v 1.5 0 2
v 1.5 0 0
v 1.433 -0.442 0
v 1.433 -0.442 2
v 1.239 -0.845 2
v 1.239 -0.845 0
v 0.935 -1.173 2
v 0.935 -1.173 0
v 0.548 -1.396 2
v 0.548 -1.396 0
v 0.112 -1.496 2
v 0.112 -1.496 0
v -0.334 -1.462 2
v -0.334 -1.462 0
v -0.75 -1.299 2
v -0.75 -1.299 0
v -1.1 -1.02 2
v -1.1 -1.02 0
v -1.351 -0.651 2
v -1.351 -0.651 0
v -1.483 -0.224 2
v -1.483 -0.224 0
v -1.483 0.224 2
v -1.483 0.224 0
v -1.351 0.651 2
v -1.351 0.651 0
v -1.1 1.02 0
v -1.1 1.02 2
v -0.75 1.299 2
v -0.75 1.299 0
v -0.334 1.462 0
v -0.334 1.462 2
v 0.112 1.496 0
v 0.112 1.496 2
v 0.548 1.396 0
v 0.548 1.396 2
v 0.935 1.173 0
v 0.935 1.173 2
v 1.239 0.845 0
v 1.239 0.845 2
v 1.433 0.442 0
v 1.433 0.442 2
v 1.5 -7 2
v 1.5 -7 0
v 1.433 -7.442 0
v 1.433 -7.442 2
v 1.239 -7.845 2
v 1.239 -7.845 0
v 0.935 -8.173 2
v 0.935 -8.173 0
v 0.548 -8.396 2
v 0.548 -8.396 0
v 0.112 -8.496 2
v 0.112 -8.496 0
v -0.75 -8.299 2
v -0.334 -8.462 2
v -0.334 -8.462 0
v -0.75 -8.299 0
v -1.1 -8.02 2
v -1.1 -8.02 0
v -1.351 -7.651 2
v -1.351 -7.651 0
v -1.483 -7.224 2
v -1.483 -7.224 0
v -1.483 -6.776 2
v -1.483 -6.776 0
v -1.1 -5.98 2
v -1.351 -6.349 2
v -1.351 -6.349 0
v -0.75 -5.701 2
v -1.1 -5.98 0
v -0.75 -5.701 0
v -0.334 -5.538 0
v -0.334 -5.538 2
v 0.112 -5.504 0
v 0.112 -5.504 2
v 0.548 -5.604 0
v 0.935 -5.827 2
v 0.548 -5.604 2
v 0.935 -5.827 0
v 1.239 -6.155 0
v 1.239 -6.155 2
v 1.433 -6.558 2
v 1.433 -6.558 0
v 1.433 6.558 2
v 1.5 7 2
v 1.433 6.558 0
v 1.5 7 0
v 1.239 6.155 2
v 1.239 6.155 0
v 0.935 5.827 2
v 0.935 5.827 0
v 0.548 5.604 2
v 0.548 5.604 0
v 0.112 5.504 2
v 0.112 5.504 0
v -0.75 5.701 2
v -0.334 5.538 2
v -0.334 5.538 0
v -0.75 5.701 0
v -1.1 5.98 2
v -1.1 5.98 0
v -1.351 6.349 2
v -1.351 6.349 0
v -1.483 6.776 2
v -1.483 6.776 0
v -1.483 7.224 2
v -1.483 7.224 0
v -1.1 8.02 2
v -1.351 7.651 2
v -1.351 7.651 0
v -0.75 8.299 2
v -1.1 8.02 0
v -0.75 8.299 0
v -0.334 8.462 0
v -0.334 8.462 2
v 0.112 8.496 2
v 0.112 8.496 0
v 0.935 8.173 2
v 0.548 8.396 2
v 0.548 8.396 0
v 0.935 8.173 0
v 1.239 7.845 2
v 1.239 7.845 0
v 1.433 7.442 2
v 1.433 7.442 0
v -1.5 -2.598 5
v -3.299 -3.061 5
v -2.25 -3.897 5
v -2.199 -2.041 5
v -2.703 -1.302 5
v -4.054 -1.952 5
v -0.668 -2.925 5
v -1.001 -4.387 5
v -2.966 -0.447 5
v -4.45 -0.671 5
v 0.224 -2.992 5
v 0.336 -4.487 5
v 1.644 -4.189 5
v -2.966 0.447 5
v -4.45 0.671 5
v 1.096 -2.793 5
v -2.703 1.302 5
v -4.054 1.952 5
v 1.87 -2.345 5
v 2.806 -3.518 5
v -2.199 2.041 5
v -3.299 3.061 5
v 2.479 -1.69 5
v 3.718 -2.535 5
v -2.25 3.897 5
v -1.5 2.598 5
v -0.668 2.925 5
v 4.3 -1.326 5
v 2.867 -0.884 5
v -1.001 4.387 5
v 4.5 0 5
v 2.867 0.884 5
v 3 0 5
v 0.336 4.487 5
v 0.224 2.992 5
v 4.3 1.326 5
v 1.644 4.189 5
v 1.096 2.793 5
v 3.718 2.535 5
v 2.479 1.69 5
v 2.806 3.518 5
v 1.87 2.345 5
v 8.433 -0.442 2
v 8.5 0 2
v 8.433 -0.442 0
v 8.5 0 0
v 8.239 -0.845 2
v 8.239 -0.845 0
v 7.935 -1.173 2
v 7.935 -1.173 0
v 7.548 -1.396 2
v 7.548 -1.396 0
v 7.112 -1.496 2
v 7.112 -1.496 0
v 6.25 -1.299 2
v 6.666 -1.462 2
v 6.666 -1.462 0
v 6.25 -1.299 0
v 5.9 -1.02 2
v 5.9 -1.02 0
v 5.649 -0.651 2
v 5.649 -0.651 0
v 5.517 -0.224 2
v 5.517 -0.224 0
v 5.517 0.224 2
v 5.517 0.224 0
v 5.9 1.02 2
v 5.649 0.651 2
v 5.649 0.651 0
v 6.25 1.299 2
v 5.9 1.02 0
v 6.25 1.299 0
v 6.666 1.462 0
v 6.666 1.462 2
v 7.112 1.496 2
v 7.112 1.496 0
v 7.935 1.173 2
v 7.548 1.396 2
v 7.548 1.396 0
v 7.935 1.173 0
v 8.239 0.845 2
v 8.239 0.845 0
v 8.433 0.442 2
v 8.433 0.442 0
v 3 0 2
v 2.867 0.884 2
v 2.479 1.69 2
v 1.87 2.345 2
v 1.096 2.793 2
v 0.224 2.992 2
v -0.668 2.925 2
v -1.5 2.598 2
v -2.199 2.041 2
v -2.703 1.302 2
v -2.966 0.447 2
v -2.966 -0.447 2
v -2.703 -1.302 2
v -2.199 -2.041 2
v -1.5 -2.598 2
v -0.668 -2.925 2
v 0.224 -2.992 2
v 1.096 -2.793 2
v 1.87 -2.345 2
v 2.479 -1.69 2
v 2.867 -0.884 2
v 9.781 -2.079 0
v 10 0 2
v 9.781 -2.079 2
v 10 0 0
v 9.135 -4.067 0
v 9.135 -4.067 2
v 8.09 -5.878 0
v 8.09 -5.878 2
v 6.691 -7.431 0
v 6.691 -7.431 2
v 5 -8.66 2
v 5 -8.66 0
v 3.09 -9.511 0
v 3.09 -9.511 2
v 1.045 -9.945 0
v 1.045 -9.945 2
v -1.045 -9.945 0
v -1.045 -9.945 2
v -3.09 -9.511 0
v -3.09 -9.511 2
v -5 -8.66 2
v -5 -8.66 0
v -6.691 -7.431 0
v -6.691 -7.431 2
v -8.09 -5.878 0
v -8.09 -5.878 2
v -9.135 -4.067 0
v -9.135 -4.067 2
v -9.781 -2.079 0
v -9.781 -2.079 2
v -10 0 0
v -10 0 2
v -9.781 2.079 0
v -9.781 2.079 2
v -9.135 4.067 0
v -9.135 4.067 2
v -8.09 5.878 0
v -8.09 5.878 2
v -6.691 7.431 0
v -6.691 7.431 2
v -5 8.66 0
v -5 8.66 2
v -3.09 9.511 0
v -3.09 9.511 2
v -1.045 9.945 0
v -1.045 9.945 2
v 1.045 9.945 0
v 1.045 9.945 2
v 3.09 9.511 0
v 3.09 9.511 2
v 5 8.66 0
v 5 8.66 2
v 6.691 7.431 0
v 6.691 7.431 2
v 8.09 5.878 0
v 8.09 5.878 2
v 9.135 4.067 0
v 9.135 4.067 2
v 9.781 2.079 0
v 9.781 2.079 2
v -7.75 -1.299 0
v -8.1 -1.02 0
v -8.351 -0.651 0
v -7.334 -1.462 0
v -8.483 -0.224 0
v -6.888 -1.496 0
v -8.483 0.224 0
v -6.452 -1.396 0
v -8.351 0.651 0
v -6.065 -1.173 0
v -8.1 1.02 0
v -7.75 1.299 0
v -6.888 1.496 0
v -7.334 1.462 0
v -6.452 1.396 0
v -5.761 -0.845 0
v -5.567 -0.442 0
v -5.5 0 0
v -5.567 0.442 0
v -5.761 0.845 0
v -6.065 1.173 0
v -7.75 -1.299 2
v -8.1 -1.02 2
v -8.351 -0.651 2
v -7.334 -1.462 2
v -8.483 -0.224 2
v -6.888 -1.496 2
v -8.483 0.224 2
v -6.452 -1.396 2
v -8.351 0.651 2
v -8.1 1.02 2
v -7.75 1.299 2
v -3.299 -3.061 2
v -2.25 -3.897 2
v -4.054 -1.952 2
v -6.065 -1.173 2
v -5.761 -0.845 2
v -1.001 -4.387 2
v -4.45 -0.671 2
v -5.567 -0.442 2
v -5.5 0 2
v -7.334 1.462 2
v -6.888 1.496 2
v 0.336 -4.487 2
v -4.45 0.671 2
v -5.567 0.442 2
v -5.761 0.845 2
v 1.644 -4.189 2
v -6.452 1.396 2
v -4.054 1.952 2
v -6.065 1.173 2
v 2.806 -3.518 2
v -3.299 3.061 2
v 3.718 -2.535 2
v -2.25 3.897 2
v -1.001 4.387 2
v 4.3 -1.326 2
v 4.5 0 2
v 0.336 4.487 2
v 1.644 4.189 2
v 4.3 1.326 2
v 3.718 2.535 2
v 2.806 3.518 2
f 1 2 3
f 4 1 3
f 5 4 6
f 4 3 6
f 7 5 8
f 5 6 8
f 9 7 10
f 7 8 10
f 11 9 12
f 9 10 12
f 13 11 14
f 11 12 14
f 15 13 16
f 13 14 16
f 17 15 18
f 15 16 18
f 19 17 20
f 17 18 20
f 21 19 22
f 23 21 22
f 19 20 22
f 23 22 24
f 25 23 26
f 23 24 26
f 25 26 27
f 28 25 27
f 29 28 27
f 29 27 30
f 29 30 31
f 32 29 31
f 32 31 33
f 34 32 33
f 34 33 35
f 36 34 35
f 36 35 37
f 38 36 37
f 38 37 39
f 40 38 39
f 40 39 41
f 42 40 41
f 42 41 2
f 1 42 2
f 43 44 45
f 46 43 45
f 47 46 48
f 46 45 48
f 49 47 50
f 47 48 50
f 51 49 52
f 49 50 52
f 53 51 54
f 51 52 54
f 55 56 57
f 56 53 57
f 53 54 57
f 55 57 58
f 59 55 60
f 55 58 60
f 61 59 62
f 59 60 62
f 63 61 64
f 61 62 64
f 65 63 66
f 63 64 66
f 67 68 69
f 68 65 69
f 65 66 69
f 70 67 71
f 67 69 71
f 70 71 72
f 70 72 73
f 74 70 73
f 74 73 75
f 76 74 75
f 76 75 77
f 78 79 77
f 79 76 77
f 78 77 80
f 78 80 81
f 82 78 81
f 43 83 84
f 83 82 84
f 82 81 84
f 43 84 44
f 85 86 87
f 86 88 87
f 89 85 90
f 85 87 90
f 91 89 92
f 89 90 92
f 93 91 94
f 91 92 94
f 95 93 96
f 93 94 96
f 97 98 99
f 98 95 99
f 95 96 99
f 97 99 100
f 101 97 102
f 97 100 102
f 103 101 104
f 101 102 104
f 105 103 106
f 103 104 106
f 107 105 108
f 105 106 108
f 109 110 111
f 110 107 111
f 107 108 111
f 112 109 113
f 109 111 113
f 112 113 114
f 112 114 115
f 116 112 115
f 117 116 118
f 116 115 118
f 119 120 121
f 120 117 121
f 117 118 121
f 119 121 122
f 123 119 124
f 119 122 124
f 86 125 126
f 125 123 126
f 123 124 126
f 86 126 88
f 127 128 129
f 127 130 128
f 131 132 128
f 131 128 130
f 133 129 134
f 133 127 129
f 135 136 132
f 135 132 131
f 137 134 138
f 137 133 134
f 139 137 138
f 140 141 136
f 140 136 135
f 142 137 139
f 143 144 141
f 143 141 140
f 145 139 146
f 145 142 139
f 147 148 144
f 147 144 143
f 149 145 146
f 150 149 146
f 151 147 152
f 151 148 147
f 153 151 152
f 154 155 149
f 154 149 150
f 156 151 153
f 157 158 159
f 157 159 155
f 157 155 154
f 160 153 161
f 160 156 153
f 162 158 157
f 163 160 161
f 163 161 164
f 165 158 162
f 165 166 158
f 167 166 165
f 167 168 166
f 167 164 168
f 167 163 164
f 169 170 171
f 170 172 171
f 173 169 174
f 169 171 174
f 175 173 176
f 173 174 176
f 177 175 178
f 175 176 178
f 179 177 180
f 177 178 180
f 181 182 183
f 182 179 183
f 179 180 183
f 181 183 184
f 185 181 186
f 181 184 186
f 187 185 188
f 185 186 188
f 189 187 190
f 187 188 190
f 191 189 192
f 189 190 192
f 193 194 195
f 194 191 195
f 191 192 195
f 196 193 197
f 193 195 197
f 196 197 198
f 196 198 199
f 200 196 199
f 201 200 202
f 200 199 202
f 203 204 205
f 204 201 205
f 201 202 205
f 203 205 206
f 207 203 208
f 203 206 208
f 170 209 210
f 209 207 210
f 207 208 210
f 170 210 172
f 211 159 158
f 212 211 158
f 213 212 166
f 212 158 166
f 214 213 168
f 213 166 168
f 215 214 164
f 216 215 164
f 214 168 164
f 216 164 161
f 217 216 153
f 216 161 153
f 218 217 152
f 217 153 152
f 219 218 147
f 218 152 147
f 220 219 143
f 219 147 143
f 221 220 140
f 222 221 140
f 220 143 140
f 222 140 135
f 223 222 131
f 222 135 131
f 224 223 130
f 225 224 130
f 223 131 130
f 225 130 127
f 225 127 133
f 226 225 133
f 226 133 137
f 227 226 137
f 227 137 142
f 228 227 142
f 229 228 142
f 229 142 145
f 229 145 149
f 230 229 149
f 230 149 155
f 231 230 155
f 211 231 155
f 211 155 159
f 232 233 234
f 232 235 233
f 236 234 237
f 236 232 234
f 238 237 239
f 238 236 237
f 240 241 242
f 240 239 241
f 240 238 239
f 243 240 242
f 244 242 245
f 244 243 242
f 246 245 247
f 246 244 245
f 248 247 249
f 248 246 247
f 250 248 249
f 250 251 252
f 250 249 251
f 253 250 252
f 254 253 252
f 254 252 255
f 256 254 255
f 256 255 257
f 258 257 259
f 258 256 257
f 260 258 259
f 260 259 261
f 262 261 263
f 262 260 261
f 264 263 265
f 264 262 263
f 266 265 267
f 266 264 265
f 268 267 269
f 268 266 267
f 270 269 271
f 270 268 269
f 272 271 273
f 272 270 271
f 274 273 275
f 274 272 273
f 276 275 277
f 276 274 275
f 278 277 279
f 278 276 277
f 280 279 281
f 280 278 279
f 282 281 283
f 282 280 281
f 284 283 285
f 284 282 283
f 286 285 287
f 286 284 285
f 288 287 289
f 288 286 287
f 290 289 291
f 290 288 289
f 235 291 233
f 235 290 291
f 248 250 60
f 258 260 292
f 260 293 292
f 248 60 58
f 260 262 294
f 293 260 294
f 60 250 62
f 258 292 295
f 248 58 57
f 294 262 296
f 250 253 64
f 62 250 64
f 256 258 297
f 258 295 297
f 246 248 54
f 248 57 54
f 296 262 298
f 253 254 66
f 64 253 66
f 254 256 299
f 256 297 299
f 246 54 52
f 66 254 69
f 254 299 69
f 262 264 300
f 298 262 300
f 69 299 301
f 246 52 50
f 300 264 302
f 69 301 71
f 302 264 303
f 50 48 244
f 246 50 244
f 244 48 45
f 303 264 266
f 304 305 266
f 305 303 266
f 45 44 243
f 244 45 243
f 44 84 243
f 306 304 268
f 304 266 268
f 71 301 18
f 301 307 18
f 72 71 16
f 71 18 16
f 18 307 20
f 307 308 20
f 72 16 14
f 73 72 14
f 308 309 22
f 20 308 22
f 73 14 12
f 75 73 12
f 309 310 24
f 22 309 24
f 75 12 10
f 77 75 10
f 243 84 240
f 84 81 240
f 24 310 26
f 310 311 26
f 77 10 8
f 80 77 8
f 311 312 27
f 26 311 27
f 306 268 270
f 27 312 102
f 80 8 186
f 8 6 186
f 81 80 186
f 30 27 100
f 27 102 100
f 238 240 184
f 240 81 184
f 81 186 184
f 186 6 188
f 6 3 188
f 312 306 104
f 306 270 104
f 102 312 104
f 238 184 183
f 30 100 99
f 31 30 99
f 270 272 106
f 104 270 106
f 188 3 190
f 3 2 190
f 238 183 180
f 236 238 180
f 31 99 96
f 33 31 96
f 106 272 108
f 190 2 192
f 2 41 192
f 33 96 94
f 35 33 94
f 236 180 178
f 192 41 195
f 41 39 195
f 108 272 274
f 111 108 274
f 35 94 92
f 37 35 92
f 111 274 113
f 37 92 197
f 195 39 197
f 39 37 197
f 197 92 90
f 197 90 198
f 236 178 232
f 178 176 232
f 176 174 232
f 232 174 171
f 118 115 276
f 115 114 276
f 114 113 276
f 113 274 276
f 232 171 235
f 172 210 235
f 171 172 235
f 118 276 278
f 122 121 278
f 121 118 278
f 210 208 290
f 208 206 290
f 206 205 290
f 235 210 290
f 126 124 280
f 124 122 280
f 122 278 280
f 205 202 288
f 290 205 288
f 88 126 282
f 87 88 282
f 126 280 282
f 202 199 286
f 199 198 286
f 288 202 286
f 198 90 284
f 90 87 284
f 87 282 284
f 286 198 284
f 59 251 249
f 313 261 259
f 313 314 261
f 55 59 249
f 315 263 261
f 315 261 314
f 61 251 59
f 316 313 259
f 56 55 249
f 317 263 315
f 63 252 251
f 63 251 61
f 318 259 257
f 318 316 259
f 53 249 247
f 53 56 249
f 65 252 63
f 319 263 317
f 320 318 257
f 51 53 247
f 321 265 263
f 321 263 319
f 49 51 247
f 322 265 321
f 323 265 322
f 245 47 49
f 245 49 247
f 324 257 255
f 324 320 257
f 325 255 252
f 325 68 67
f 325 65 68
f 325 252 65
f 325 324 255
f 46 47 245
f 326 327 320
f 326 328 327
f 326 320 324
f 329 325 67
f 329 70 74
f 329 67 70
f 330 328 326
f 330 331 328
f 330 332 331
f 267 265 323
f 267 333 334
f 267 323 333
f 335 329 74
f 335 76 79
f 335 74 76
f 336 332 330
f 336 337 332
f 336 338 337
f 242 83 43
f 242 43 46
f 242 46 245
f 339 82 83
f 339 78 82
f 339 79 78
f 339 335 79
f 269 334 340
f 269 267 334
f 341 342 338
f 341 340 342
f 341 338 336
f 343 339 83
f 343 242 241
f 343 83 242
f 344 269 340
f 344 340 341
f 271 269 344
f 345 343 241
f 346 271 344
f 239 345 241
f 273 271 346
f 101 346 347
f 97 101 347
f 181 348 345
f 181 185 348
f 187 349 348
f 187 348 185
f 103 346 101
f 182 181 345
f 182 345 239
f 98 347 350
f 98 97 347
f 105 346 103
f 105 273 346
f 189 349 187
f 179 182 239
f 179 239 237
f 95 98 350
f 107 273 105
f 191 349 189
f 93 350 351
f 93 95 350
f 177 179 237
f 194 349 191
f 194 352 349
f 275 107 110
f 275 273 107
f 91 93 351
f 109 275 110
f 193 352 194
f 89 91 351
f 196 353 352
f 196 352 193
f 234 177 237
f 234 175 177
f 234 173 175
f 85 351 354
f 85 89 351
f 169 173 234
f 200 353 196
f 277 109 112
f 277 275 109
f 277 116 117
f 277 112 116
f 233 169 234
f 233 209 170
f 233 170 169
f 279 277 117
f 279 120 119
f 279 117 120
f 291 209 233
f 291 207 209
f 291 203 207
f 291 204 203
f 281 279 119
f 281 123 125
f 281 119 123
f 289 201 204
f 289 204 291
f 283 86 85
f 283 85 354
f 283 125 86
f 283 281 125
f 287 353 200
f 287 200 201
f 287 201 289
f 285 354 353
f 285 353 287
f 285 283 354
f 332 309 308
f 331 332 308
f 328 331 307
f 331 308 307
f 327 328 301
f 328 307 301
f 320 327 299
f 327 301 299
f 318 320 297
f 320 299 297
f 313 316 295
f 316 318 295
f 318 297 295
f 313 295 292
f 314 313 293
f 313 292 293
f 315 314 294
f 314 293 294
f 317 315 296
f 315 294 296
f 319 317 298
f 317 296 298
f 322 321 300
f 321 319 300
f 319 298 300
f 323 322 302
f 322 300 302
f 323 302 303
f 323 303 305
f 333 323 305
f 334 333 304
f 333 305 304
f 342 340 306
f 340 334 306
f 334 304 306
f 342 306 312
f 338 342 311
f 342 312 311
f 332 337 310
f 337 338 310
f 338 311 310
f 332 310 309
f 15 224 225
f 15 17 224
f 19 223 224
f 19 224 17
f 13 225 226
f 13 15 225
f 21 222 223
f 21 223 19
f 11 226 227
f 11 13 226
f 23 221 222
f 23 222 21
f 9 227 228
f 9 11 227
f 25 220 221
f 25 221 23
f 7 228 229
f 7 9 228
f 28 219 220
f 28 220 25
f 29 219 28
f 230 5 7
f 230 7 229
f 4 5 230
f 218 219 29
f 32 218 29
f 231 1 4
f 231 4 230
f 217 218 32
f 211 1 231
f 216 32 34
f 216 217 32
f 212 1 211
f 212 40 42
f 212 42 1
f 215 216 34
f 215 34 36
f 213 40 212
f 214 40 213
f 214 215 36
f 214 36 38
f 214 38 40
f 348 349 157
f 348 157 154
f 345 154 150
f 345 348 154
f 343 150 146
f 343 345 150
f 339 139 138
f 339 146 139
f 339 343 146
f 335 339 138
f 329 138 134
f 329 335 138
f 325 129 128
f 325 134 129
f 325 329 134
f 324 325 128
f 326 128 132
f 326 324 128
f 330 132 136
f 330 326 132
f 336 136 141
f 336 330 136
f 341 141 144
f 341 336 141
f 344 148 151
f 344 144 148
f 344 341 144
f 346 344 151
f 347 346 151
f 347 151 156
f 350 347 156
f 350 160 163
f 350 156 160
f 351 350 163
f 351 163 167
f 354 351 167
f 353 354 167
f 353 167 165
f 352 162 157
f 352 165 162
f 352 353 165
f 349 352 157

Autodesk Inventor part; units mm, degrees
ref_plane "YZ Plane" through (0, 0, 0) normal (1, 0, 0) x (0, 1, 0)
ref_plane "XZ Plane" through (0, 0, 0) normal (0, 1, 0) x (-1, 0, 0)
ref_plane "XY Plane" through (0, 0, 0) normal (0, 0, 1) x (1, 0, 0)
sketch "Sketch1" plane through (0, 0, 0) normal (0, 0, 1) x (1, 0, 0)
  circle A0 centre (0, 0) radius 10
  circle A1 centre (7, 0) radius 1.5
  circle A2 centre (0, 7) radius 1.5
  circle A3 centre (-7, 0) radius 1.5
  circle A4 centre (0, -7) radius 1.5
  circle A5 centre (0, 0) radius 1.5
  dimension "d0" = 20
  dimension "d1" = 3
  dimension "d2" = 7
  dimension "d5" = 360
  dimension "d7" = 3
extrude "Extrusion1" add sketch "Sketch1" along normal blind 2
sketch "Sketch2" plane through (0, 0, 2) normal (0, 0, 1) x (1, 0, 0)
  circle A0 centre (0, 0) radius 4.5
  circle A1 centre (0, 0) radius 1.5 projected
  dimension "d10" = 9
extrude "Extrusion2" add sketch "Sketch2" along normal blind 3
sketch "Sketch3" plane through (0, 0, 5) normal (0, 0, 1) x (1, 0, 0)
  circle A0 centre (0, 0) radius 3
  dimension "d13" = 6
extrude "Extrusion3" cut sketch "Sketch3" against normal blind 3
properties part number "Servo Mounting Hub" material "Aluminum 6061"
